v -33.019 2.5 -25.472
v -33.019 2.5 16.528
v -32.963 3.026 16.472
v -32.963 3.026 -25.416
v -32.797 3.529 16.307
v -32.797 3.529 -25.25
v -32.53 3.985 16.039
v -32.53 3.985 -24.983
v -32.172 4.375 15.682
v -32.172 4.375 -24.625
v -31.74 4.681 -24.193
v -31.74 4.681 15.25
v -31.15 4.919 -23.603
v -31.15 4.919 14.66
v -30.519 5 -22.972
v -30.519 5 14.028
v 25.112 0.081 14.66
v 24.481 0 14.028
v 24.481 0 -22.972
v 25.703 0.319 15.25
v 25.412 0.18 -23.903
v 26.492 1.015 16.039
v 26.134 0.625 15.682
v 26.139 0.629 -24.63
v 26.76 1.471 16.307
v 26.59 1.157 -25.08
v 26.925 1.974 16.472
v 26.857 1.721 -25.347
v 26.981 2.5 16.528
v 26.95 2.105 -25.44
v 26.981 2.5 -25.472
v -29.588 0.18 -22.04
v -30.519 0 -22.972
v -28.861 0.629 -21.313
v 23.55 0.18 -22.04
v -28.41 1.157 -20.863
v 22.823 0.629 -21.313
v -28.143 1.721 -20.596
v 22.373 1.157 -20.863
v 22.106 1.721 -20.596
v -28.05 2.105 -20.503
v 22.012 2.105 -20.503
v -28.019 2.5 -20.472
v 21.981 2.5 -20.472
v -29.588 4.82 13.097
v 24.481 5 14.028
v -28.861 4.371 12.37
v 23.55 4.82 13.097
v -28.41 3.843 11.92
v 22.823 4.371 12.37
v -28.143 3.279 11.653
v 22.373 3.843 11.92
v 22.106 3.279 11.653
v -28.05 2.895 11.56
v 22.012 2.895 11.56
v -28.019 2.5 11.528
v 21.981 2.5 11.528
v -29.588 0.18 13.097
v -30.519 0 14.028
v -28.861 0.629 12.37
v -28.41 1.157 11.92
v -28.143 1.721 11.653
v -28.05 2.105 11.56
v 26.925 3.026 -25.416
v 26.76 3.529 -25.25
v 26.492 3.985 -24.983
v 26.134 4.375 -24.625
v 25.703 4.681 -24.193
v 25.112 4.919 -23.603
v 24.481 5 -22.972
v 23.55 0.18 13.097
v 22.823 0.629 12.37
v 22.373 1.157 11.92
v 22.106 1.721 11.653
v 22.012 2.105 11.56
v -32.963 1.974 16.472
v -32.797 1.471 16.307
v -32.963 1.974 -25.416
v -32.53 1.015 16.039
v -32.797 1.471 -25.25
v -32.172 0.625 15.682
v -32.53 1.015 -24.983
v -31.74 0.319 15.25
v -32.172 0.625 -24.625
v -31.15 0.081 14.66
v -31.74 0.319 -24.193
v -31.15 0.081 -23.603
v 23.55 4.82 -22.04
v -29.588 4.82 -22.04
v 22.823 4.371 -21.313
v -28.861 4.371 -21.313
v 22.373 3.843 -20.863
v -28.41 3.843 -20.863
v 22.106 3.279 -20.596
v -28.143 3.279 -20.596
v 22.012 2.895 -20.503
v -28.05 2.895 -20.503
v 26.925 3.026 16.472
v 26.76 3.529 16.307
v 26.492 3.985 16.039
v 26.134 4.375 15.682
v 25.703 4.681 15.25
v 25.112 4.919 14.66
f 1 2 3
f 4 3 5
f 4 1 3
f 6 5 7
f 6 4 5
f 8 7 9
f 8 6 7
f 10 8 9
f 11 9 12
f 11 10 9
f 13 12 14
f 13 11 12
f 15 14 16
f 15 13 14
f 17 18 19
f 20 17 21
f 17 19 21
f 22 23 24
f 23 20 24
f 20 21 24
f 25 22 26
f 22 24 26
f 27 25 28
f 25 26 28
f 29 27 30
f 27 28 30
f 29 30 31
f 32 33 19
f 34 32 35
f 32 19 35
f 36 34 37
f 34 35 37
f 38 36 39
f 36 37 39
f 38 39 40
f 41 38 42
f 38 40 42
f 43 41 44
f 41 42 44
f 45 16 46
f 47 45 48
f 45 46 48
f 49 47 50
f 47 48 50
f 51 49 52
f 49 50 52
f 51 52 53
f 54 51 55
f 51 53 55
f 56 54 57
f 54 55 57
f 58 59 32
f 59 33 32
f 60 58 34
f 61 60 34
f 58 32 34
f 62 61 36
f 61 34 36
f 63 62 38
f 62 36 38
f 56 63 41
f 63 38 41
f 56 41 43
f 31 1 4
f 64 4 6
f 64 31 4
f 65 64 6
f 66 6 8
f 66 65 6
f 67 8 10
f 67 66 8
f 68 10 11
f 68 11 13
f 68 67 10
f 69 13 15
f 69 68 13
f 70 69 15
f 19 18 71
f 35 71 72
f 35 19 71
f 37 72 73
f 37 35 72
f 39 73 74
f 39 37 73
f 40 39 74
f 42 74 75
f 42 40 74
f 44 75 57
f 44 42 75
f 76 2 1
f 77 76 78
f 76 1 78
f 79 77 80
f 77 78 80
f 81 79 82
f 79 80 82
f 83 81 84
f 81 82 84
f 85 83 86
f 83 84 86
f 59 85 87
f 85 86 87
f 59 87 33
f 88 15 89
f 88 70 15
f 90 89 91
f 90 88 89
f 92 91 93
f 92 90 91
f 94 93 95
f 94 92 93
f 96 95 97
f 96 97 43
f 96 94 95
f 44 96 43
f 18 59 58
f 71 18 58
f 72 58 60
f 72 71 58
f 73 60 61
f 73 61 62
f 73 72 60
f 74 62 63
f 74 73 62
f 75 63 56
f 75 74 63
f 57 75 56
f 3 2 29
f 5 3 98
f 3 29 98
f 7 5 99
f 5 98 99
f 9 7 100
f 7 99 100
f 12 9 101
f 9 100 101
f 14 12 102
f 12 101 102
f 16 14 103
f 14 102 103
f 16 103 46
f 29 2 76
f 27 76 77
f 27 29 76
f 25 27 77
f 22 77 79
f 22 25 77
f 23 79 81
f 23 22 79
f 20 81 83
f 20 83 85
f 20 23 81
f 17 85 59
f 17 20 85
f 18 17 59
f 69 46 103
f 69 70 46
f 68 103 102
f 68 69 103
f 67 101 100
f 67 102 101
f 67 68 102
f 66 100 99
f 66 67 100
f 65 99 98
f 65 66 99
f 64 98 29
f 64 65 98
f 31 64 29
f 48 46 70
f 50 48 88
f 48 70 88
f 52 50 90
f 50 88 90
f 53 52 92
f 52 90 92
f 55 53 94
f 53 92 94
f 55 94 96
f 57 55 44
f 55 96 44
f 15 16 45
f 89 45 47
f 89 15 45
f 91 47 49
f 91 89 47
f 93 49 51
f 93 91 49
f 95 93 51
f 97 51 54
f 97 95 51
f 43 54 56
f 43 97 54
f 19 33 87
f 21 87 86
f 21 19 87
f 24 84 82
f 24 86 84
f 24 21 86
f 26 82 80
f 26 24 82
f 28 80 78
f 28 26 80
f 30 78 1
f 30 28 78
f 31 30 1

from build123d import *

# Parameters (mm, degrees)
SKETCH1_W           = 60
SKETCH1_H           = 42
BOSS_EXTRUDE1_DEPTH = 5
SKETCH2_W           = 50
SKETCH2_H           = 32
CUT_EXTRUDE1_DEPTH  = 5
FILLET1_R           = 2.5
FILLET2_R           = 2.5


with BuildPart() as part:
    # Sketch1 → Boss-Extrude1 (new body)
    with BuildSketch(Plane(origin=(0, 0, 0), x_dir=(1, 0, 0), z_dir=(0, 1, 0))):
        with Locations((-3.018867925, 4.471698113)):
            Rectangle(SKETCH1_W, SKETCH1_H)
    extrude(amount=BOSS_EXTRUDE1_DEPTH)

    # Sketch2 → Cut-Extrude1 (cut)
    with BuildSketch(Plane(origin=(0, 5, 0), x_dir=(1, 0, 0), z_dir=(0, 1, 0))):
        with Locations((-3.018867925, 4.471698113)):
            Rectangle(SKETCH2_W, SKETCH2_H)
    extrude(amount=-CUT_EXTRUDE1_DEPTH, mode=Mode.SUBTRACT)

    # Fillet1
    fillet1_edges = [part.edges().sort_by_distance(p)[0] for p in [
        (-3.018867925, 5, 16.528301887),
        (-33.018867925, 5, -4.471698113),
        (-28.018867925, 5, -4.471698113),
        (-3.018867925, 5, 11.528301887),
        (21.981132075, 5, -4.471698113),
        (-3.018867925, 5, -20.471698113),
        (-3.018867925, 5, -25.471698113),
        (26.981132075, 5, -4.471698113),
    ]]
    fillet(fillet1_edges, radius=FILLET1_R - 0.0001)  # a hair under: the kernel refuses the full size

    # Fillet2
    fillet2_edges = [part.edges().sort_by_distance(p)[0] for p in [
        (-33.018867925, 0, -4.471698113),
        (-3.018867925, 0, 16.528301887),
        (26.981132075, 0, -4.471698113),
        (-3.018867925, 0, -25.471698113),
        (-3.018867925, 0, -20.471698113),
        (21.981132075, 0, -4.471698113),
        (-3.018867925, 0, 11.528301887),
        (-28.018867925, 0, -4.471698113),
    ]]
    fillet(fillet2_edges, radius=FILLET2_R - 0.0001)  # a hair under: the kernel refuses the full size


solid = part.part
